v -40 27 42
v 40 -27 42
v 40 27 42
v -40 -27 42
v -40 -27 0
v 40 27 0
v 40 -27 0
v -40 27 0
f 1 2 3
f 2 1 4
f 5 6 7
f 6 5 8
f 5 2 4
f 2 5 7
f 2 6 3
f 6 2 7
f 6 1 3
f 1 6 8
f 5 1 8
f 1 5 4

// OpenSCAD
// Starter file for OpenSCAD task-039
$fn = 64;

module guard_blank() {
	translate(v = [-40.0, -27.0, 0]) {
		cube(size = [80, 54, 42]);
	}
}

guard_blank();
